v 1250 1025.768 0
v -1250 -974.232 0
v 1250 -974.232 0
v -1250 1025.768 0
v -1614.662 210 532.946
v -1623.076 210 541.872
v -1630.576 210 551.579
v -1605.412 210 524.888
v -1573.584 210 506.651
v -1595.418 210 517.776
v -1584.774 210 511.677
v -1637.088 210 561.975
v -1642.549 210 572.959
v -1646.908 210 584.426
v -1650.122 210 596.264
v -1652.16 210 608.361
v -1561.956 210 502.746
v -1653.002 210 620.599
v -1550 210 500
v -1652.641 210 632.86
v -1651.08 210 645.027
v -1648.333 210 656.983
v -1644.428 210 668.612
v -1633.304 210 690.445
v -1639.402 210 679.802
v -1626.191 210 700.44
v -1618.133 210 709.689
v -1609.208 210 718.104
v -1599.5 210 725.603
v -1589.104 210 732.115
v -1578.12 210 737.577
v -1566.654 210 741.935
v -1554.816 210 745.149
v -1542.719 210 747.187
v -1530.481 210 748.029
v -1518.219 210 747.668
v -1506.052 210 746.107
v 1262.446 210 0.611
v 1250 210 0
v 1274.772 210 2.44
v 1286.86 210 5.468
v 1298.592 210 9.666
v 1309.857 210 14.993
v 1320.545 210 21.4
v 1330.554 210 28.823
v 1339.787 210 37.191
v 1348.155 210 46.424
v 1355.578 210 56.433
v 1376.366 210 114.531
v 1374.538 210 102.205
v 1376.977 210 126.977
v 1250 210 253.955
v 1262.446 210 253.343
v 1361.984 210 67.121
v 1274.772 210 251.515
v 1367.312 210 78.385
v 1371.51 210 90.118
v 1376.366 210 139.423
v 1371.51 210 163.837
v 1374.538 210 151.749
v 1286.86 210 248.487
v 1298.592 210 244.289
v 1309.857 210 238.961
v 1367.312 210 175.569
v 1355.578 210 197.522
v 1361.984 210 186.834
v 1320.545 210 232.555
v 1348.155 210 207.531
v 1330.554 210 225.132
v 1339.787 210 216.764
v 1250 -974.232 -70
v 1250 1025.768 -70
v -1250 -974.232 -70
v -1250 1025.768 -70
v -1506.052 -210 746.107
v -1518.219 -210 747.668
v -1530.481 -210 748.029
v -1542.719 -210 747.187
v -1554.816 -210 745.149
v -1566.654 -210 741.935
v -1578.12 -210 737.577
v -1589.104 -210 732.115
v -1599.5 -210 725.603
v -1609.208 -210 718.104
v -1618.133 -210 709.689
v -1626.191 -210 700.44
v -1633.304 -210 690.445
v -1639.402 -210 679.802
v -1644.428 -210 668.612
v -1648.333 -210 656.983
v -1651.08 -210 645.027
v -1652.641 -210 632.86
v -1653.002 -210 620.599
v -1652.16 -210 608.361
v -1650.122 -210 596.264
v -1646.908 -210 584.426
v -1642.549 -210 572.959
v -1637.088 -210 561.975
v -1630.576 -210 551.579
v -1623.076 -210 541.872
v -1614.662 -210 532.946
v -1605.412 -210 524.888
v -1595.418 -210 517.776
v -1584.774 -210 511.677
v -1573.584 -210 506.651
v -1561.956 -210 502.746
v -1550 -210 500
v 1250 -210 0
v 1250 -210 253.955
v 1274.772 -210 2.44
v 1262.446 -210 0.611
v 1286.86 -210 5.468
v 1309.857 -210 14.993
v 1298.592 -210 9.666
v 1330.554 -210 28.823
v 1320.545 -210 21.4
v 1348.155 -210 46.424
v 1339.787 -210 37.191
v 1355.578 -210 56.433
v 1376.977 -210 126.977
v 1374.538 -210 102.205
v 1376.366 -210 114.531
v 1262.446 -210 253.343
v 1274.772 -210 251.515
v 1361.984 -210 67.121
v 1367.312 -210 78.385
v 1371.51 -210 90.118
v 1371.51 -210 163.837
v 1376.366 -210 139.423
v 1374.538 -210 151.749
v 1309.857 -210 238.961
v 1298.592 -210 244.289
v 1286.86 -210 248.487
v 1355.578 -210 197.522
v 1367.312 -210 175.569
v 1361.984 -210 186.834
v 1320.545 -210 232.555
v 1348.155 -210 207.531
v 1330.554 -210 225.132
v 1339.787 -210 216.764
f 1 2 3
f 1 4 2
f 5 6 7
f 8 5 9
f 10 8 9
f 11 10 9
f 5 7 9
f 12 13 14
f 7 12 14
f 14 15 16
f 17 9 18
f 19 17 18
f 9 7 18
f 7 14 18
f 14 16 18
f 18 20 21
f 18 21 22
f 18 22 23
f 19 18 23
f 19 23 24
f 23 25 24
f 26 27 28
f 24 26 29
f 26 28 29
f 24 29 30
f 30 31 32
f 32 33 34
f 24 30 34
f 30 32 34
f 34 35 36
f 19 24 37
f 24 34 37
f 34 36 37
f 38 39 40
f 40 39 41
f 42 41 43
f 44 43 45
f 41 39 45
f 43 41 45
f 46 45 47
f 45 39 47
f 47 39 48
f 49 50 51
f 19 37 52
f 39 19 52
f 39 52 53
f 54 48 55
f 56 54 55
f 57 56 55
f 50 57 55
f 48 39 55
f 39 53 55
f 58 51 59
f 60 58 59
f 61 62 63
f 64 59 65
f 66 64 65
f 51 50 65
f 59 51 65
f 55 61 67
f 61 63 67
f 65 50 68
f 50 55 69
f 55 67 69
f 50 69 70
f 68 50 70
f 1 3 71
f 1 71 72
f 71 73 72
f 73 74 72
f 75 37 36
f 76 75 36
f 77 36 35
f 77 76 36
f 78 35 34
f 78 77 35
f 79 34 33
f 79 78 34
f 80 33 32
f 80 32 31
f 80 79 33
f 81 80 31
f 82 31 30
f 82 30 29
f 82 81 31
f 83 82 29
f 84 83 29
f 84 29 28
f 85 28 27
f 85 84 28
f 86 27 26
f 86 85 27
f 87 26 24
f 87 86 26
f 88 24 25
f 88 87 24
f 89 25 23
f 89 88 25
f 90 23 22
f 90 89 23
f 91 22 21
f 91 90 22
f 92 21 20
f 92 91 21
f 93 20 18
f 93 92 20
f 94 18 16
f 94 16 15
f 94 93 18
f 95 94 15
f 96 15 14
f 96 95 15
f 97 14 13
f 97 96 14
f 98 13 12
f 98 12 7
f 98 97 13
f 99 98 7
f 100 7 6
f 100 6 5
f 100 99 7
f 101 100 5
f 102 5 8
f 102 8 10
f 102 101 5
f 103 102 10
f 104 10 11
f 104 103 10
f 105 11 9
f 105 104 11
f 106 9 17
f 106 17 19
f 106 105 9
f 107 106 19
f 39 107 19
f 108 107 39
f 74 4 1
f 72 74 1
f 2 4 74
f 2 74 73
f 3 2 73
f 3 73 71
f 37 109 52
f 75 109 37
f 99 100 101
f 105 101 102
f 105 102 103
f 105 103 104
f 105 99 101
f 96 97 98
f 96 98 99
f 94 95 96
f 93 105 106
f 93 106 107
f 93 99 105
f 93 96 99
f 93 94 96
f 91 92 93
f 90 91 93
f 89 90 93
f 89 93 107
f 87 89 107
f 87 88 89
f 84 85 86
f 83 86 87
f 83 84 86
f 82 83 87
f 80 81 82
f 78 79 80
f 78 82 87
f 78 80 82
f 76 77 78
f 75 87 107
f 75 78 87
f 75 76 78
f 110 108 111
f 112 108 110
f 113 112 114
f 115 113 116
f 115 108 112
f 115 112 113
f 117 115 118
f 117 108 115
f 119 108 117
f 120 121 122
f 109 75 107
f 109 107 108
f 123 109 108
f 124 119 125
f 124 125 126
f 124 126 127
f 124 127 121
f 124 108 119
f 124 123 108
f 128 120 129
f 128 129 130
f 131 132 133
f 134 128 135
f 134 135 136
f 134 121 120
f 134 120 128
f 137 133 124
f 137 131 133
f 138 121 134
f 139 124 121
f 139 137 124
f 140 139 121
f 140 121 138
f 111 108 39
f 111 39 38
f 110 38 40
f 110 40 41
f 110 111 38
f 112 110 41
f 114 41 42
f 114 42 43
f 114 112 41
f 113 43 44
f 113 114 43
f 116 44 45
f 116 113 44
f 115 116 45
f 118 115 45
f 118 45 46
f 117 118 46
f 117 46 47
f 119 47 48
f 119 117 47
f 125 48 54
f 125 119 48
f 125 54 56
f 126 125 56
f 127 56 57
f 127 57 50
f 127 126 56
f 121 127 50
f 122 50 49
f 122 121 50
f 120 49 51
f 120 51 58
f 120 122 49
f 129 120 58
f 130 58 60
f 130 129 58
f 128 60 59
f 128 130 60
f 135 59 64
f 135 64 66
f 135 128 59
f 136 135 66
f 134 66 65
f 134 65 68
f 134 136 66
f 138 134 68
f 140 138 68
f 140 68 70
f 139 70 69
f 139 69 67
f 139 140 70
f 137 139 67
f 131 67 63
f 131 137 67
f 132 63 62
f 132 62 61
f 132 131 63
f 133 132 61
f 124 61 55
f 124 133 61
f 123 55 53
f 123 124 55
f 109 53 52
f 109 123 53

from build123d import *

# Parameters (mm, degrees)
F0_W     = 2500
F0_H     = 764.2315775156
F0_H_2   = 420
F0_H_3   = 815.7684224844
F1_DEPTH = 70
F3_DEPTH = 210


with BuildPart() as f1:
    # F0 (on Top) → F1 (new body)
    with BuildSketch(Plane.XY):
        with Locations((0, -592.1157887578)):
            Rectangle(F0_W, F0_H)
        Rectangle(F0_W, F0_H_2)
        with Locations((0, 617.8842112422)):
            Rectangle(F0_W, F0_H_3)
    extrude(amount=-F1_DEPTH)


with BuildPart() as f3:
    # F2 (on Front) → F3 (new body, symmetric)
    with BuildSketch(Plane.XZ):
        with BuildLine():
            ThreePointArc((-1506.0523403791, 746.1068938771), (-1651.0796171281, 645.027276749), (-1550, 500))
            Line((-1550, 500), (1250, 0))
            ThreePointArc((1250, 0), (1376.977345119, 126.977345119), (1250, 253.954690238))
            Line((1250, 253.954690238), (-1506.0523403791, 746.1068938771))
        make_face()
    extrude(amount=F3_DEPTH, both=True)


solid = Compound([f1.part, f3.part])
